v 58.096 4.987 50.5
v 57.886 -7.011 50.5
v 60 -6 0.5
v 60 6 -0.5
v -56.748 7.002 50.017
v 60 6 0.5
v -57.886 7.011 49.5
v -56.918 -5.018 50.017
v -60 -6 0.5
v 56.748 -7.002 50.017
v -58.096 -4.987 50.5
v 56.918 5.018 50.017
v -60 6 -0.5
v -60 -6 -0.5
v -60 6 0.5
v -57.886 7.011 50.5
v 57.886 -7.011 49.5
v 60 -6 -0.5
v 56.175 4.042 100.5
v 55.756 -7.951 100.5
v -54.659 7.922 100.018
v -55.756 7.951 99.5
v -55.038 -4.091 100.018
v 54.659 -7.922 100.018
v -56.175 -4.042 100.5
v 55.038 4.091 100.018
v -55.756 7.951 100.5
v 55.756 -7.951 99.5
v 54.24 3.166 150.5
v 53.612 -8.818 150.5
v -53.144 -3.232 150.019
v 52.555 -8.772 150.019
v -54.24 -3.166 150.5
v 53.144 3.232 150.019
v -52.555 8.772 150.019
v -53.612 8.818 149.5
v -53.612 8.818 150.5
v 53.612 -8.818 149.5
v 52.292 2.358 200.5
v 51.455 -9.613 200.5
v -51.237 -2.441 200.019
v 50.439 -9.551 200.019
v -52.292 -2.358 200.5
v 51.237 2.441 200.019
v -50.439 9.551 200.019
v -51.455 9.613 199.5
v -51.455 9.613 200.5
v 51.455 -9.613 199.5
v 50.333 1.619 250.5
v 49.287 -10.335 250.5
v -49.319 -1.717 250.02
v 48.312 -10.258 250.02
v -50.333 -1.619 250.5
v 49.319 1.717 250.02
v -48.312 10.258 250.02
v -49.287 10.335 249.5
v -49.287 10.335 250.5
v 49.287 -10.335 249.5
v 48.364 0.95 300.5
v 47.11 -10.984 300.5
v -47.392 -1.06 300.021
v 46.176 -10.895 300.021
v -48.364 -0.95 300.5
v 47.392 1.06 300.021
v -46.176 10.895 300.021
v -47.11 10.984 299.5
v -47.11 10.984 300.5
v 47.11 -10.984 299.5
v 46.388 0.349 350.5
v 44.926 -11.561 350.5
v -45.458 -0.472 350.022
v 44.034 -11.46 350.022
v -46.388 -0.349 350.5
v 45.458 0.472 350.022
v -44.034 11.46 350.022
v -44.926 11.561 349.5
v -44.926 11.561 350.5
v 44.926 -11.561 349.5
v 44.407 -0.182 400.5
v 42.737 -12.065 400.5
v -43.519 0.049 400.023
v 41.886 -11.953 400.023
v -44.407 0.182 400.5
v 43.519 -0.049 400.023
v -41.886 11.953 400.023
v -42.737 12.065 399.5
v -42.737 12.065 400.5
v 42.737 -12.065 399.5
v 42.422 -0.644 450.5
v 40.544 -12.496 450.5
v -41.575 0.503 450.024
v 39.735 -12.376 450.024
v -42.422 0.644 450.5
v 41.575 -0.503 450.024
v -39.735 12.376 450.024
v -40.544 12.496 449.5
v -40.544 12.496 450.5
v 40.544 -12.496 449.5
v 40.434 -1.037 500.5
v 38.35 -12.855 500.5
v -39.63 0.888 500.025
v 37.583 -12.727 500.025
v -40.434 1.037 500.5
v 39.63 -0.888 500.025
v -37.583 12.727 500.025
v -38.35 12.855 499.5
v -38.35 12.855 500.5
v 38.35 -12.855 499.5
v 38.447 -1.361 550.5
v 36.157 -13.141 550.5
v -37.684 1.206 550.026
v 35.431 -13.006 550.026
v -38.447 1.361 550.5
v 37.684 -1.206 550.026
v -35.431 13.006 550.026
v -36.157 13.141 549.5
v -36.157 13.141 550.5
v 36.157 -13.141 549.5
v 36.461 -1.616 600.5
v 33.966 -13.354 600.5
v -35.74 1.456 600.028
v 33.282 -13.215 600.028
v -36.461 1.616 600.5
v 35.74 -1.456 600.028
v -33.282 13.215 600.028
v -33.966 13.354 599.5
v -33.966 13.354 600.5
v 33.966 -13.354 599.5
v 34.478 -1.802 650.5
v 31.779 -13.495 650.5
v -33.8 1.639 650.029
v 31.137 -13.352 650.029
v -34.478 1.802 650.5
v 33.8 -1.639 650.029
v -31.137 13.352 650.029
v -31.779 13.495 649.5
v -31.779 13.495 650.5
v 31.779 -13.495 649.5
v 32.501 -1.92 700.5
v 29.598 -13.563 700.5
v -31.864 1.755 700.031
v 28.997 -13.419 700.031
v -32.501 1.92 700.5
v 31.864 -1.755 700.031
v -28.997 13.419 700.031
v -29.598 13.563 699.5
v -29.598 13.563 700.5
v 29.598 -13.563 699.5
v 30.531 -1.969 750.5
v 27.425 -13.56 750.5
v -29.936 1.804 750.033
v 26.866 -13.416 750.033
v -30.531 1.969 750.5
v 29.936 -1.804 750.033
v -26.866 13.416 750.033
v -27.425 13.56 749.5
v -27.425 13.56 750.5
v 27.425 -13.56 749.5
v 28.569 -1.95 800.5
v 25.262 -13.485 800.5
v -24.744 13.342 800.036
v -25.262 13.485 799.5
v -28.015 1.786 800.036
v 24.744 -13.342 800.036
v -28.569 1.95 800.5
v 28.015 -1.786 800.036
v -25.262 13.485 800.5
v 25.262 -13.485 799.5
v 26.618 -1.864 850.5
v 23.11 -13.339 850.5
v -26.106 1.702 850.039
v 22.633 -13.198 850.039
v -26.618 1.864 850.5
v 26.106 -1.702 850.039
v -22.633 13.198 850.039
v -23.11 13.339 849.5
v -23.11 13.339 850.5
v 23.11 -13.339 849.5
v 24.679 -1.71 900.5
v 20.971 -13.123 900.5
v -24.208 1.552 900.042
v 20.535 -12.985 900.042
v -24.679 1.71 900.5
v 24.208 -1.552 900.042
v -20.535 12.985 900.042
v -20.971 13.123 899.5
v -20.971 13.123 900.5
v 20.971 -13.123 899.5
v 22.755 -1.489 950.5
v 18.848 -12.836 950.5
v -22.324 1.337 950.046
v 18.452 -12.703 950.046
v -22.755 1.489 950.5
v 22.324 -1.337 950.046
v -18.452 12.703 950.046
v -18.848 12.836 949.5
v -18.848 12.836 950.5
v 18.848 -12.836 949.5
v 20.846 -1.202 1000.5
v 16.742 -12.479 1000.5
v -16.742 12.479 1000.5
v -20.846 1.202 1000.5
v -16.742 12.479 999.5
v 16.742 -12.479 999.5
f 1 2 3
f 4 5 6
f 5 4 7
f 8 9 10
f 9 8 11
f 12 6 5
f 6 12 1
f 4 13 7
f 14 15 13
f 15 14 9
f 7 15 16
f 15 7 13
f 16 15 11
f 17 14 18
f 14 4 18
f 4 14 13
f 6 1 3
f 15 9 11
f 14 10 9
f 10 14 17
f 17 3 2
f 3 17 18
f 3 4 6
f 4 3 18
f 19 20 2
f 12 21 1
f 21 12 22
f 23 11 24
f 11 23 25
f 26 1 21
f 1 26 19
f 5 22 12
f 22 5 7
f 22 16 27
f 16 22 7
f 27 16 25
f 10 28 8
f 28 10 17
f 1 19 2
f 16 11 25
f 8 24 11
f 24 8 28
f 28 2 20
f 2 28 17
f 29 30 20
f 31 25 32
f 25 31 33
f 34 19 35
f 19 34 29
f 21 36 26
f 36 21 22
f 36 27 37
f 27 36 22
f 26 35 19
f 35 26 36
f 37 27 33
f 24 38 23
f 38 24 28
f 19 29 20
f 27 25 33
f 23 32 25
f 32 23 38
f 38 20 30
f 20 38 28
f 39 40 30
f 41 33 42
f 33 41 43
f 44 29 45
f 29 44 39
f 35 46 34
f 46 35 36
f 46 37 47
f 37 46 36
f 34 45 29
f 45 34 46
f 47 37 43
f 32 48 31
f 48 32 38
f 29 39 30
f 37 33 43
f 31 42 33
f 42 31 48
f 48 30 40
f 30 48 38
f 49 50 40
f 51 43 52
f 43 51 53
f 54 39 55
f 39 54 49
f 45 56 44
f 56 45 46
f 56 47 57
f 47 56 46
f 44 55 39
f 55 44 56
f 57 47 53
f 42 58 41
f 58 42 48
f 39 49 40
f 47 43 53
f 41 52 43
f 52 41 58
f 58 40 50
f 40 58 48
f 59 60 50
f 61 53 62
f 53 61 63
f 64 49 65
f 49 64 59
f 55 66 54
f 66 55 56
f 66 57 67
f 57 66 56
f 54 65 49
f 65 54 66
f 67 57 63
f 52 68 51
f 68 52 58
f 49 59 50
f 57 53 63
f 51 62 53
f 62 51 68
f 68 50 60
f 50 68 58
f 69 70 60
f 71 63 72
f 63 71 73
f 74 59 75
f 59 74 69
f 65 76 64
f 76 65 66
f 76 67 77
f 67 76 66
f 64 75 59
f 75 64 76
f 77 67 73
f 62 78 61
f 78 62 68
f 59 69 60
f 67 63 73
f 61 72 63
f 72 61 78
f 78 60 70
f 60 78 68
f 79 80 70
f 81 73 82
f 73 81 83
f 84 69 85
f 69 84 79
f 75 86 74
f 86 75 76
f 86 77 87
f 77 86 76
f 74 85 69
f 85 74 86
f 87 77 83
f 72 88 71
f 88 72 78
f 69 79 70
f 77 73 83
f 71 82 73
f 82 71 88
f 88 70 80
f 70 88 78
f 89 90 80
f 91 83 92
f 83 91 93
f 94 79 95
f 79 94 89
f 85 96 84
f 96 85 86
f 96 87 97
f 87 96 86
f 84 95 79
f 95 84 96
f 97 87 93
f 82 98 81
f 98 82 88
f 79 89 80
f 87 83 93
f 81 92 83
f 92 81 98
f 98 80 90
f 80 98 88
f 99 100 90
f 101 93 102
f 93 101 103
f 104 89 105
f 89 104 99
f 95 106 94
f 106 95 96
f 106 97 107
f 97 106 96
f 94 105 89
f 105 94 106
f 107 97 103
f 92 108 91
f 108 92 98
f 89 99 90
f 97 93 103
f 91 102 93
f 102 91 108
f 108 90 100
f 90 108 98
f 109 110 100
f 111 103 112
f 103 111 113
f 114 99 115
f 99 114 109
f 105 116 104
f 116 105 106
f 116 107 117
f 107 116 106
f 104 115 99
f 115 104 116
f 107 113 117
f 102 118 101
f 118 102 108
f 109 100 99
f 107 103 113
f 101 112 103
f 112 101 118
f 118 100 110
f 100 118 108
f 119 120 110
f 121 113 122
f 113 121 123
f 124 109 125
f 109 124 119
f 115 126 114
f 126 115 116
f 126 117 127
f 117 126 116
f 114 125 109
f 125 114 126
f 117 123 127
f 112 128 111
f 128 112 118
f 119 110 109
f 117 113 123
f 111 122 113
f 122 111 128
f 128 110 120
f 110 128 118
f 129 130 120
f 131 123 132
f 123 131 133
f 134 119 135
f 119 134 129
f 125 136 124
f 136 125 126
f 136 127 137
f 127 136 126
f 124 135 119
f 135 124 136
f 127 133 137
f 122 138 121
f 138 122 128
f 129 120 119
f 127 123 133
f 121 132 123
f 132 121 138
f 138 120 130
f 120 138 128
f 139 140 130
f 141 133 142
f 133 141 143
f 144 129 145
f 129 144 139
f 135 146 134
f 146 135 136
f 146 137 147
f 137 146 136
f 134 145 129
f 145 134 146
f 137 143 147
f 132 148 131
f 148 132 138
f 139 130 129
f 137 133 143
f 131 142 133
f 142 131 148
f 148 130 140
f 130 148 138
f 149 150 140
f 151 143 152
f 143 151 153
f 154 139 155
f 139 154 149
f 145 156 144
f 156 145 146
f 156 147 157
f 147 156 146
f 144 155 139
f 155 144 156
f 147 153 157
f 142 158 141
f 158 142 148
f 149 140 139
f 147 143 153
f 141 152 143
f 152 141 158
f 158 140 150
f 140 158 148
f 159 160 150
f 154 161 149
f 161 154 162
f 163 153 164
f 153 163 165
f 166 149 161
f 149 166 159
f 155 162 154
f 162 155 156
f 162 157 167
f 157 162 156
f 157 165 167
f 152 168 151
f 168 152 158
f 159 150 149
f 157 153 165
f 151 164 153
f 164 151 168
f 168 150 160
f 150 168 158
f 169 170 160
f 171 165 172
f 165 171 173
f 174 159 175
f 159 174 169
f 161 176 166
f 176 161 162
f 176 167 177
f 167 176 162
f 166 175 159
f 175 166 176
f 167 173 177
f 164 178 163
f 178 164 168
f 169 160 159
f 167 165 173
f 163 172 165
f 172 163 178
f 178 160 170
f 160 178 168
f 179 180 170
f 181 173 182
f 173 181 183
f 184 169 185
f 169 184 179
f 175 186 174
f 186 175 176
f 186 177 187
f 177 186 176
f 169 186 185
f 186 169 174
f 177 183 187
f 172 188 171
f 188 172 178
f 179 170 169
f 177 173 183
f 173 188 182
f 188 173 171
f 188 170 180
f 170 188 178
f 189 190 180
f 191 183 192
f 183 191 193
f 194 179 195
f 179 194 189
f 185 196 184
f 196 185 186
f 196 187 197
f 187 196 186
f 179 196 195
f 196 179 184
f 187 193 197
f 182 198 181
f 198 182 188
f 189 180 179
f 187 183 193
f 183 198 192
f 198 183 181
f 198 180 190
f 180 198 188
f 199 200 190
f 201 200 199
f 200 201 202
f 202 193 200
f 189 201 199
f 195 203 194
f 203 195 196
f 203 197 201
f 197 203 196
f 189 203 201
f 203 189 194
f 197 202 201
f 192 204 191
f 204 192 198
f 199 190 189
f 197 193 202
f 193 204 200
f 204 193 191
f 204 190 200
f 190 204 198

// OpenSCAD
// Wind Turbine Blade — Parametric
// Entry: pnk:01HZX0K8J9Q7R3VY6T2M4B8N43/energy/wind-power
// License: MIT

blade_len    = 1000;  // mm
root_chord   = 120;   // mm
tip_chord    = 40;    // mm
thickness    = 12;    // mm
twist_deg    = 20;    // deg from root to tip

module blade() {
    steps = 20;
    for (i = [0 : steps - 1]) {
        t0 = i / steps;
        t1 = (i + 1) / steps;
        hull() {
            translate([0, 0, t0 * blade_len])
                rotate([0, 0, -t0 * twist_deg])
                    scale([1, 1, 1])
                        cube([root_chord * (1 - t0) + tip_chord * t0,
                              thickness,
                              1], center=true);
            translate([0, 0, t1 * blade_len])
                rotate([0, 0, -t1 * twist_deg])
                    cube([root_chord * (1 - t1) + tip_chord * t1,
                          thickness,
                          1], center=true);
        }
    }
}

blade();
